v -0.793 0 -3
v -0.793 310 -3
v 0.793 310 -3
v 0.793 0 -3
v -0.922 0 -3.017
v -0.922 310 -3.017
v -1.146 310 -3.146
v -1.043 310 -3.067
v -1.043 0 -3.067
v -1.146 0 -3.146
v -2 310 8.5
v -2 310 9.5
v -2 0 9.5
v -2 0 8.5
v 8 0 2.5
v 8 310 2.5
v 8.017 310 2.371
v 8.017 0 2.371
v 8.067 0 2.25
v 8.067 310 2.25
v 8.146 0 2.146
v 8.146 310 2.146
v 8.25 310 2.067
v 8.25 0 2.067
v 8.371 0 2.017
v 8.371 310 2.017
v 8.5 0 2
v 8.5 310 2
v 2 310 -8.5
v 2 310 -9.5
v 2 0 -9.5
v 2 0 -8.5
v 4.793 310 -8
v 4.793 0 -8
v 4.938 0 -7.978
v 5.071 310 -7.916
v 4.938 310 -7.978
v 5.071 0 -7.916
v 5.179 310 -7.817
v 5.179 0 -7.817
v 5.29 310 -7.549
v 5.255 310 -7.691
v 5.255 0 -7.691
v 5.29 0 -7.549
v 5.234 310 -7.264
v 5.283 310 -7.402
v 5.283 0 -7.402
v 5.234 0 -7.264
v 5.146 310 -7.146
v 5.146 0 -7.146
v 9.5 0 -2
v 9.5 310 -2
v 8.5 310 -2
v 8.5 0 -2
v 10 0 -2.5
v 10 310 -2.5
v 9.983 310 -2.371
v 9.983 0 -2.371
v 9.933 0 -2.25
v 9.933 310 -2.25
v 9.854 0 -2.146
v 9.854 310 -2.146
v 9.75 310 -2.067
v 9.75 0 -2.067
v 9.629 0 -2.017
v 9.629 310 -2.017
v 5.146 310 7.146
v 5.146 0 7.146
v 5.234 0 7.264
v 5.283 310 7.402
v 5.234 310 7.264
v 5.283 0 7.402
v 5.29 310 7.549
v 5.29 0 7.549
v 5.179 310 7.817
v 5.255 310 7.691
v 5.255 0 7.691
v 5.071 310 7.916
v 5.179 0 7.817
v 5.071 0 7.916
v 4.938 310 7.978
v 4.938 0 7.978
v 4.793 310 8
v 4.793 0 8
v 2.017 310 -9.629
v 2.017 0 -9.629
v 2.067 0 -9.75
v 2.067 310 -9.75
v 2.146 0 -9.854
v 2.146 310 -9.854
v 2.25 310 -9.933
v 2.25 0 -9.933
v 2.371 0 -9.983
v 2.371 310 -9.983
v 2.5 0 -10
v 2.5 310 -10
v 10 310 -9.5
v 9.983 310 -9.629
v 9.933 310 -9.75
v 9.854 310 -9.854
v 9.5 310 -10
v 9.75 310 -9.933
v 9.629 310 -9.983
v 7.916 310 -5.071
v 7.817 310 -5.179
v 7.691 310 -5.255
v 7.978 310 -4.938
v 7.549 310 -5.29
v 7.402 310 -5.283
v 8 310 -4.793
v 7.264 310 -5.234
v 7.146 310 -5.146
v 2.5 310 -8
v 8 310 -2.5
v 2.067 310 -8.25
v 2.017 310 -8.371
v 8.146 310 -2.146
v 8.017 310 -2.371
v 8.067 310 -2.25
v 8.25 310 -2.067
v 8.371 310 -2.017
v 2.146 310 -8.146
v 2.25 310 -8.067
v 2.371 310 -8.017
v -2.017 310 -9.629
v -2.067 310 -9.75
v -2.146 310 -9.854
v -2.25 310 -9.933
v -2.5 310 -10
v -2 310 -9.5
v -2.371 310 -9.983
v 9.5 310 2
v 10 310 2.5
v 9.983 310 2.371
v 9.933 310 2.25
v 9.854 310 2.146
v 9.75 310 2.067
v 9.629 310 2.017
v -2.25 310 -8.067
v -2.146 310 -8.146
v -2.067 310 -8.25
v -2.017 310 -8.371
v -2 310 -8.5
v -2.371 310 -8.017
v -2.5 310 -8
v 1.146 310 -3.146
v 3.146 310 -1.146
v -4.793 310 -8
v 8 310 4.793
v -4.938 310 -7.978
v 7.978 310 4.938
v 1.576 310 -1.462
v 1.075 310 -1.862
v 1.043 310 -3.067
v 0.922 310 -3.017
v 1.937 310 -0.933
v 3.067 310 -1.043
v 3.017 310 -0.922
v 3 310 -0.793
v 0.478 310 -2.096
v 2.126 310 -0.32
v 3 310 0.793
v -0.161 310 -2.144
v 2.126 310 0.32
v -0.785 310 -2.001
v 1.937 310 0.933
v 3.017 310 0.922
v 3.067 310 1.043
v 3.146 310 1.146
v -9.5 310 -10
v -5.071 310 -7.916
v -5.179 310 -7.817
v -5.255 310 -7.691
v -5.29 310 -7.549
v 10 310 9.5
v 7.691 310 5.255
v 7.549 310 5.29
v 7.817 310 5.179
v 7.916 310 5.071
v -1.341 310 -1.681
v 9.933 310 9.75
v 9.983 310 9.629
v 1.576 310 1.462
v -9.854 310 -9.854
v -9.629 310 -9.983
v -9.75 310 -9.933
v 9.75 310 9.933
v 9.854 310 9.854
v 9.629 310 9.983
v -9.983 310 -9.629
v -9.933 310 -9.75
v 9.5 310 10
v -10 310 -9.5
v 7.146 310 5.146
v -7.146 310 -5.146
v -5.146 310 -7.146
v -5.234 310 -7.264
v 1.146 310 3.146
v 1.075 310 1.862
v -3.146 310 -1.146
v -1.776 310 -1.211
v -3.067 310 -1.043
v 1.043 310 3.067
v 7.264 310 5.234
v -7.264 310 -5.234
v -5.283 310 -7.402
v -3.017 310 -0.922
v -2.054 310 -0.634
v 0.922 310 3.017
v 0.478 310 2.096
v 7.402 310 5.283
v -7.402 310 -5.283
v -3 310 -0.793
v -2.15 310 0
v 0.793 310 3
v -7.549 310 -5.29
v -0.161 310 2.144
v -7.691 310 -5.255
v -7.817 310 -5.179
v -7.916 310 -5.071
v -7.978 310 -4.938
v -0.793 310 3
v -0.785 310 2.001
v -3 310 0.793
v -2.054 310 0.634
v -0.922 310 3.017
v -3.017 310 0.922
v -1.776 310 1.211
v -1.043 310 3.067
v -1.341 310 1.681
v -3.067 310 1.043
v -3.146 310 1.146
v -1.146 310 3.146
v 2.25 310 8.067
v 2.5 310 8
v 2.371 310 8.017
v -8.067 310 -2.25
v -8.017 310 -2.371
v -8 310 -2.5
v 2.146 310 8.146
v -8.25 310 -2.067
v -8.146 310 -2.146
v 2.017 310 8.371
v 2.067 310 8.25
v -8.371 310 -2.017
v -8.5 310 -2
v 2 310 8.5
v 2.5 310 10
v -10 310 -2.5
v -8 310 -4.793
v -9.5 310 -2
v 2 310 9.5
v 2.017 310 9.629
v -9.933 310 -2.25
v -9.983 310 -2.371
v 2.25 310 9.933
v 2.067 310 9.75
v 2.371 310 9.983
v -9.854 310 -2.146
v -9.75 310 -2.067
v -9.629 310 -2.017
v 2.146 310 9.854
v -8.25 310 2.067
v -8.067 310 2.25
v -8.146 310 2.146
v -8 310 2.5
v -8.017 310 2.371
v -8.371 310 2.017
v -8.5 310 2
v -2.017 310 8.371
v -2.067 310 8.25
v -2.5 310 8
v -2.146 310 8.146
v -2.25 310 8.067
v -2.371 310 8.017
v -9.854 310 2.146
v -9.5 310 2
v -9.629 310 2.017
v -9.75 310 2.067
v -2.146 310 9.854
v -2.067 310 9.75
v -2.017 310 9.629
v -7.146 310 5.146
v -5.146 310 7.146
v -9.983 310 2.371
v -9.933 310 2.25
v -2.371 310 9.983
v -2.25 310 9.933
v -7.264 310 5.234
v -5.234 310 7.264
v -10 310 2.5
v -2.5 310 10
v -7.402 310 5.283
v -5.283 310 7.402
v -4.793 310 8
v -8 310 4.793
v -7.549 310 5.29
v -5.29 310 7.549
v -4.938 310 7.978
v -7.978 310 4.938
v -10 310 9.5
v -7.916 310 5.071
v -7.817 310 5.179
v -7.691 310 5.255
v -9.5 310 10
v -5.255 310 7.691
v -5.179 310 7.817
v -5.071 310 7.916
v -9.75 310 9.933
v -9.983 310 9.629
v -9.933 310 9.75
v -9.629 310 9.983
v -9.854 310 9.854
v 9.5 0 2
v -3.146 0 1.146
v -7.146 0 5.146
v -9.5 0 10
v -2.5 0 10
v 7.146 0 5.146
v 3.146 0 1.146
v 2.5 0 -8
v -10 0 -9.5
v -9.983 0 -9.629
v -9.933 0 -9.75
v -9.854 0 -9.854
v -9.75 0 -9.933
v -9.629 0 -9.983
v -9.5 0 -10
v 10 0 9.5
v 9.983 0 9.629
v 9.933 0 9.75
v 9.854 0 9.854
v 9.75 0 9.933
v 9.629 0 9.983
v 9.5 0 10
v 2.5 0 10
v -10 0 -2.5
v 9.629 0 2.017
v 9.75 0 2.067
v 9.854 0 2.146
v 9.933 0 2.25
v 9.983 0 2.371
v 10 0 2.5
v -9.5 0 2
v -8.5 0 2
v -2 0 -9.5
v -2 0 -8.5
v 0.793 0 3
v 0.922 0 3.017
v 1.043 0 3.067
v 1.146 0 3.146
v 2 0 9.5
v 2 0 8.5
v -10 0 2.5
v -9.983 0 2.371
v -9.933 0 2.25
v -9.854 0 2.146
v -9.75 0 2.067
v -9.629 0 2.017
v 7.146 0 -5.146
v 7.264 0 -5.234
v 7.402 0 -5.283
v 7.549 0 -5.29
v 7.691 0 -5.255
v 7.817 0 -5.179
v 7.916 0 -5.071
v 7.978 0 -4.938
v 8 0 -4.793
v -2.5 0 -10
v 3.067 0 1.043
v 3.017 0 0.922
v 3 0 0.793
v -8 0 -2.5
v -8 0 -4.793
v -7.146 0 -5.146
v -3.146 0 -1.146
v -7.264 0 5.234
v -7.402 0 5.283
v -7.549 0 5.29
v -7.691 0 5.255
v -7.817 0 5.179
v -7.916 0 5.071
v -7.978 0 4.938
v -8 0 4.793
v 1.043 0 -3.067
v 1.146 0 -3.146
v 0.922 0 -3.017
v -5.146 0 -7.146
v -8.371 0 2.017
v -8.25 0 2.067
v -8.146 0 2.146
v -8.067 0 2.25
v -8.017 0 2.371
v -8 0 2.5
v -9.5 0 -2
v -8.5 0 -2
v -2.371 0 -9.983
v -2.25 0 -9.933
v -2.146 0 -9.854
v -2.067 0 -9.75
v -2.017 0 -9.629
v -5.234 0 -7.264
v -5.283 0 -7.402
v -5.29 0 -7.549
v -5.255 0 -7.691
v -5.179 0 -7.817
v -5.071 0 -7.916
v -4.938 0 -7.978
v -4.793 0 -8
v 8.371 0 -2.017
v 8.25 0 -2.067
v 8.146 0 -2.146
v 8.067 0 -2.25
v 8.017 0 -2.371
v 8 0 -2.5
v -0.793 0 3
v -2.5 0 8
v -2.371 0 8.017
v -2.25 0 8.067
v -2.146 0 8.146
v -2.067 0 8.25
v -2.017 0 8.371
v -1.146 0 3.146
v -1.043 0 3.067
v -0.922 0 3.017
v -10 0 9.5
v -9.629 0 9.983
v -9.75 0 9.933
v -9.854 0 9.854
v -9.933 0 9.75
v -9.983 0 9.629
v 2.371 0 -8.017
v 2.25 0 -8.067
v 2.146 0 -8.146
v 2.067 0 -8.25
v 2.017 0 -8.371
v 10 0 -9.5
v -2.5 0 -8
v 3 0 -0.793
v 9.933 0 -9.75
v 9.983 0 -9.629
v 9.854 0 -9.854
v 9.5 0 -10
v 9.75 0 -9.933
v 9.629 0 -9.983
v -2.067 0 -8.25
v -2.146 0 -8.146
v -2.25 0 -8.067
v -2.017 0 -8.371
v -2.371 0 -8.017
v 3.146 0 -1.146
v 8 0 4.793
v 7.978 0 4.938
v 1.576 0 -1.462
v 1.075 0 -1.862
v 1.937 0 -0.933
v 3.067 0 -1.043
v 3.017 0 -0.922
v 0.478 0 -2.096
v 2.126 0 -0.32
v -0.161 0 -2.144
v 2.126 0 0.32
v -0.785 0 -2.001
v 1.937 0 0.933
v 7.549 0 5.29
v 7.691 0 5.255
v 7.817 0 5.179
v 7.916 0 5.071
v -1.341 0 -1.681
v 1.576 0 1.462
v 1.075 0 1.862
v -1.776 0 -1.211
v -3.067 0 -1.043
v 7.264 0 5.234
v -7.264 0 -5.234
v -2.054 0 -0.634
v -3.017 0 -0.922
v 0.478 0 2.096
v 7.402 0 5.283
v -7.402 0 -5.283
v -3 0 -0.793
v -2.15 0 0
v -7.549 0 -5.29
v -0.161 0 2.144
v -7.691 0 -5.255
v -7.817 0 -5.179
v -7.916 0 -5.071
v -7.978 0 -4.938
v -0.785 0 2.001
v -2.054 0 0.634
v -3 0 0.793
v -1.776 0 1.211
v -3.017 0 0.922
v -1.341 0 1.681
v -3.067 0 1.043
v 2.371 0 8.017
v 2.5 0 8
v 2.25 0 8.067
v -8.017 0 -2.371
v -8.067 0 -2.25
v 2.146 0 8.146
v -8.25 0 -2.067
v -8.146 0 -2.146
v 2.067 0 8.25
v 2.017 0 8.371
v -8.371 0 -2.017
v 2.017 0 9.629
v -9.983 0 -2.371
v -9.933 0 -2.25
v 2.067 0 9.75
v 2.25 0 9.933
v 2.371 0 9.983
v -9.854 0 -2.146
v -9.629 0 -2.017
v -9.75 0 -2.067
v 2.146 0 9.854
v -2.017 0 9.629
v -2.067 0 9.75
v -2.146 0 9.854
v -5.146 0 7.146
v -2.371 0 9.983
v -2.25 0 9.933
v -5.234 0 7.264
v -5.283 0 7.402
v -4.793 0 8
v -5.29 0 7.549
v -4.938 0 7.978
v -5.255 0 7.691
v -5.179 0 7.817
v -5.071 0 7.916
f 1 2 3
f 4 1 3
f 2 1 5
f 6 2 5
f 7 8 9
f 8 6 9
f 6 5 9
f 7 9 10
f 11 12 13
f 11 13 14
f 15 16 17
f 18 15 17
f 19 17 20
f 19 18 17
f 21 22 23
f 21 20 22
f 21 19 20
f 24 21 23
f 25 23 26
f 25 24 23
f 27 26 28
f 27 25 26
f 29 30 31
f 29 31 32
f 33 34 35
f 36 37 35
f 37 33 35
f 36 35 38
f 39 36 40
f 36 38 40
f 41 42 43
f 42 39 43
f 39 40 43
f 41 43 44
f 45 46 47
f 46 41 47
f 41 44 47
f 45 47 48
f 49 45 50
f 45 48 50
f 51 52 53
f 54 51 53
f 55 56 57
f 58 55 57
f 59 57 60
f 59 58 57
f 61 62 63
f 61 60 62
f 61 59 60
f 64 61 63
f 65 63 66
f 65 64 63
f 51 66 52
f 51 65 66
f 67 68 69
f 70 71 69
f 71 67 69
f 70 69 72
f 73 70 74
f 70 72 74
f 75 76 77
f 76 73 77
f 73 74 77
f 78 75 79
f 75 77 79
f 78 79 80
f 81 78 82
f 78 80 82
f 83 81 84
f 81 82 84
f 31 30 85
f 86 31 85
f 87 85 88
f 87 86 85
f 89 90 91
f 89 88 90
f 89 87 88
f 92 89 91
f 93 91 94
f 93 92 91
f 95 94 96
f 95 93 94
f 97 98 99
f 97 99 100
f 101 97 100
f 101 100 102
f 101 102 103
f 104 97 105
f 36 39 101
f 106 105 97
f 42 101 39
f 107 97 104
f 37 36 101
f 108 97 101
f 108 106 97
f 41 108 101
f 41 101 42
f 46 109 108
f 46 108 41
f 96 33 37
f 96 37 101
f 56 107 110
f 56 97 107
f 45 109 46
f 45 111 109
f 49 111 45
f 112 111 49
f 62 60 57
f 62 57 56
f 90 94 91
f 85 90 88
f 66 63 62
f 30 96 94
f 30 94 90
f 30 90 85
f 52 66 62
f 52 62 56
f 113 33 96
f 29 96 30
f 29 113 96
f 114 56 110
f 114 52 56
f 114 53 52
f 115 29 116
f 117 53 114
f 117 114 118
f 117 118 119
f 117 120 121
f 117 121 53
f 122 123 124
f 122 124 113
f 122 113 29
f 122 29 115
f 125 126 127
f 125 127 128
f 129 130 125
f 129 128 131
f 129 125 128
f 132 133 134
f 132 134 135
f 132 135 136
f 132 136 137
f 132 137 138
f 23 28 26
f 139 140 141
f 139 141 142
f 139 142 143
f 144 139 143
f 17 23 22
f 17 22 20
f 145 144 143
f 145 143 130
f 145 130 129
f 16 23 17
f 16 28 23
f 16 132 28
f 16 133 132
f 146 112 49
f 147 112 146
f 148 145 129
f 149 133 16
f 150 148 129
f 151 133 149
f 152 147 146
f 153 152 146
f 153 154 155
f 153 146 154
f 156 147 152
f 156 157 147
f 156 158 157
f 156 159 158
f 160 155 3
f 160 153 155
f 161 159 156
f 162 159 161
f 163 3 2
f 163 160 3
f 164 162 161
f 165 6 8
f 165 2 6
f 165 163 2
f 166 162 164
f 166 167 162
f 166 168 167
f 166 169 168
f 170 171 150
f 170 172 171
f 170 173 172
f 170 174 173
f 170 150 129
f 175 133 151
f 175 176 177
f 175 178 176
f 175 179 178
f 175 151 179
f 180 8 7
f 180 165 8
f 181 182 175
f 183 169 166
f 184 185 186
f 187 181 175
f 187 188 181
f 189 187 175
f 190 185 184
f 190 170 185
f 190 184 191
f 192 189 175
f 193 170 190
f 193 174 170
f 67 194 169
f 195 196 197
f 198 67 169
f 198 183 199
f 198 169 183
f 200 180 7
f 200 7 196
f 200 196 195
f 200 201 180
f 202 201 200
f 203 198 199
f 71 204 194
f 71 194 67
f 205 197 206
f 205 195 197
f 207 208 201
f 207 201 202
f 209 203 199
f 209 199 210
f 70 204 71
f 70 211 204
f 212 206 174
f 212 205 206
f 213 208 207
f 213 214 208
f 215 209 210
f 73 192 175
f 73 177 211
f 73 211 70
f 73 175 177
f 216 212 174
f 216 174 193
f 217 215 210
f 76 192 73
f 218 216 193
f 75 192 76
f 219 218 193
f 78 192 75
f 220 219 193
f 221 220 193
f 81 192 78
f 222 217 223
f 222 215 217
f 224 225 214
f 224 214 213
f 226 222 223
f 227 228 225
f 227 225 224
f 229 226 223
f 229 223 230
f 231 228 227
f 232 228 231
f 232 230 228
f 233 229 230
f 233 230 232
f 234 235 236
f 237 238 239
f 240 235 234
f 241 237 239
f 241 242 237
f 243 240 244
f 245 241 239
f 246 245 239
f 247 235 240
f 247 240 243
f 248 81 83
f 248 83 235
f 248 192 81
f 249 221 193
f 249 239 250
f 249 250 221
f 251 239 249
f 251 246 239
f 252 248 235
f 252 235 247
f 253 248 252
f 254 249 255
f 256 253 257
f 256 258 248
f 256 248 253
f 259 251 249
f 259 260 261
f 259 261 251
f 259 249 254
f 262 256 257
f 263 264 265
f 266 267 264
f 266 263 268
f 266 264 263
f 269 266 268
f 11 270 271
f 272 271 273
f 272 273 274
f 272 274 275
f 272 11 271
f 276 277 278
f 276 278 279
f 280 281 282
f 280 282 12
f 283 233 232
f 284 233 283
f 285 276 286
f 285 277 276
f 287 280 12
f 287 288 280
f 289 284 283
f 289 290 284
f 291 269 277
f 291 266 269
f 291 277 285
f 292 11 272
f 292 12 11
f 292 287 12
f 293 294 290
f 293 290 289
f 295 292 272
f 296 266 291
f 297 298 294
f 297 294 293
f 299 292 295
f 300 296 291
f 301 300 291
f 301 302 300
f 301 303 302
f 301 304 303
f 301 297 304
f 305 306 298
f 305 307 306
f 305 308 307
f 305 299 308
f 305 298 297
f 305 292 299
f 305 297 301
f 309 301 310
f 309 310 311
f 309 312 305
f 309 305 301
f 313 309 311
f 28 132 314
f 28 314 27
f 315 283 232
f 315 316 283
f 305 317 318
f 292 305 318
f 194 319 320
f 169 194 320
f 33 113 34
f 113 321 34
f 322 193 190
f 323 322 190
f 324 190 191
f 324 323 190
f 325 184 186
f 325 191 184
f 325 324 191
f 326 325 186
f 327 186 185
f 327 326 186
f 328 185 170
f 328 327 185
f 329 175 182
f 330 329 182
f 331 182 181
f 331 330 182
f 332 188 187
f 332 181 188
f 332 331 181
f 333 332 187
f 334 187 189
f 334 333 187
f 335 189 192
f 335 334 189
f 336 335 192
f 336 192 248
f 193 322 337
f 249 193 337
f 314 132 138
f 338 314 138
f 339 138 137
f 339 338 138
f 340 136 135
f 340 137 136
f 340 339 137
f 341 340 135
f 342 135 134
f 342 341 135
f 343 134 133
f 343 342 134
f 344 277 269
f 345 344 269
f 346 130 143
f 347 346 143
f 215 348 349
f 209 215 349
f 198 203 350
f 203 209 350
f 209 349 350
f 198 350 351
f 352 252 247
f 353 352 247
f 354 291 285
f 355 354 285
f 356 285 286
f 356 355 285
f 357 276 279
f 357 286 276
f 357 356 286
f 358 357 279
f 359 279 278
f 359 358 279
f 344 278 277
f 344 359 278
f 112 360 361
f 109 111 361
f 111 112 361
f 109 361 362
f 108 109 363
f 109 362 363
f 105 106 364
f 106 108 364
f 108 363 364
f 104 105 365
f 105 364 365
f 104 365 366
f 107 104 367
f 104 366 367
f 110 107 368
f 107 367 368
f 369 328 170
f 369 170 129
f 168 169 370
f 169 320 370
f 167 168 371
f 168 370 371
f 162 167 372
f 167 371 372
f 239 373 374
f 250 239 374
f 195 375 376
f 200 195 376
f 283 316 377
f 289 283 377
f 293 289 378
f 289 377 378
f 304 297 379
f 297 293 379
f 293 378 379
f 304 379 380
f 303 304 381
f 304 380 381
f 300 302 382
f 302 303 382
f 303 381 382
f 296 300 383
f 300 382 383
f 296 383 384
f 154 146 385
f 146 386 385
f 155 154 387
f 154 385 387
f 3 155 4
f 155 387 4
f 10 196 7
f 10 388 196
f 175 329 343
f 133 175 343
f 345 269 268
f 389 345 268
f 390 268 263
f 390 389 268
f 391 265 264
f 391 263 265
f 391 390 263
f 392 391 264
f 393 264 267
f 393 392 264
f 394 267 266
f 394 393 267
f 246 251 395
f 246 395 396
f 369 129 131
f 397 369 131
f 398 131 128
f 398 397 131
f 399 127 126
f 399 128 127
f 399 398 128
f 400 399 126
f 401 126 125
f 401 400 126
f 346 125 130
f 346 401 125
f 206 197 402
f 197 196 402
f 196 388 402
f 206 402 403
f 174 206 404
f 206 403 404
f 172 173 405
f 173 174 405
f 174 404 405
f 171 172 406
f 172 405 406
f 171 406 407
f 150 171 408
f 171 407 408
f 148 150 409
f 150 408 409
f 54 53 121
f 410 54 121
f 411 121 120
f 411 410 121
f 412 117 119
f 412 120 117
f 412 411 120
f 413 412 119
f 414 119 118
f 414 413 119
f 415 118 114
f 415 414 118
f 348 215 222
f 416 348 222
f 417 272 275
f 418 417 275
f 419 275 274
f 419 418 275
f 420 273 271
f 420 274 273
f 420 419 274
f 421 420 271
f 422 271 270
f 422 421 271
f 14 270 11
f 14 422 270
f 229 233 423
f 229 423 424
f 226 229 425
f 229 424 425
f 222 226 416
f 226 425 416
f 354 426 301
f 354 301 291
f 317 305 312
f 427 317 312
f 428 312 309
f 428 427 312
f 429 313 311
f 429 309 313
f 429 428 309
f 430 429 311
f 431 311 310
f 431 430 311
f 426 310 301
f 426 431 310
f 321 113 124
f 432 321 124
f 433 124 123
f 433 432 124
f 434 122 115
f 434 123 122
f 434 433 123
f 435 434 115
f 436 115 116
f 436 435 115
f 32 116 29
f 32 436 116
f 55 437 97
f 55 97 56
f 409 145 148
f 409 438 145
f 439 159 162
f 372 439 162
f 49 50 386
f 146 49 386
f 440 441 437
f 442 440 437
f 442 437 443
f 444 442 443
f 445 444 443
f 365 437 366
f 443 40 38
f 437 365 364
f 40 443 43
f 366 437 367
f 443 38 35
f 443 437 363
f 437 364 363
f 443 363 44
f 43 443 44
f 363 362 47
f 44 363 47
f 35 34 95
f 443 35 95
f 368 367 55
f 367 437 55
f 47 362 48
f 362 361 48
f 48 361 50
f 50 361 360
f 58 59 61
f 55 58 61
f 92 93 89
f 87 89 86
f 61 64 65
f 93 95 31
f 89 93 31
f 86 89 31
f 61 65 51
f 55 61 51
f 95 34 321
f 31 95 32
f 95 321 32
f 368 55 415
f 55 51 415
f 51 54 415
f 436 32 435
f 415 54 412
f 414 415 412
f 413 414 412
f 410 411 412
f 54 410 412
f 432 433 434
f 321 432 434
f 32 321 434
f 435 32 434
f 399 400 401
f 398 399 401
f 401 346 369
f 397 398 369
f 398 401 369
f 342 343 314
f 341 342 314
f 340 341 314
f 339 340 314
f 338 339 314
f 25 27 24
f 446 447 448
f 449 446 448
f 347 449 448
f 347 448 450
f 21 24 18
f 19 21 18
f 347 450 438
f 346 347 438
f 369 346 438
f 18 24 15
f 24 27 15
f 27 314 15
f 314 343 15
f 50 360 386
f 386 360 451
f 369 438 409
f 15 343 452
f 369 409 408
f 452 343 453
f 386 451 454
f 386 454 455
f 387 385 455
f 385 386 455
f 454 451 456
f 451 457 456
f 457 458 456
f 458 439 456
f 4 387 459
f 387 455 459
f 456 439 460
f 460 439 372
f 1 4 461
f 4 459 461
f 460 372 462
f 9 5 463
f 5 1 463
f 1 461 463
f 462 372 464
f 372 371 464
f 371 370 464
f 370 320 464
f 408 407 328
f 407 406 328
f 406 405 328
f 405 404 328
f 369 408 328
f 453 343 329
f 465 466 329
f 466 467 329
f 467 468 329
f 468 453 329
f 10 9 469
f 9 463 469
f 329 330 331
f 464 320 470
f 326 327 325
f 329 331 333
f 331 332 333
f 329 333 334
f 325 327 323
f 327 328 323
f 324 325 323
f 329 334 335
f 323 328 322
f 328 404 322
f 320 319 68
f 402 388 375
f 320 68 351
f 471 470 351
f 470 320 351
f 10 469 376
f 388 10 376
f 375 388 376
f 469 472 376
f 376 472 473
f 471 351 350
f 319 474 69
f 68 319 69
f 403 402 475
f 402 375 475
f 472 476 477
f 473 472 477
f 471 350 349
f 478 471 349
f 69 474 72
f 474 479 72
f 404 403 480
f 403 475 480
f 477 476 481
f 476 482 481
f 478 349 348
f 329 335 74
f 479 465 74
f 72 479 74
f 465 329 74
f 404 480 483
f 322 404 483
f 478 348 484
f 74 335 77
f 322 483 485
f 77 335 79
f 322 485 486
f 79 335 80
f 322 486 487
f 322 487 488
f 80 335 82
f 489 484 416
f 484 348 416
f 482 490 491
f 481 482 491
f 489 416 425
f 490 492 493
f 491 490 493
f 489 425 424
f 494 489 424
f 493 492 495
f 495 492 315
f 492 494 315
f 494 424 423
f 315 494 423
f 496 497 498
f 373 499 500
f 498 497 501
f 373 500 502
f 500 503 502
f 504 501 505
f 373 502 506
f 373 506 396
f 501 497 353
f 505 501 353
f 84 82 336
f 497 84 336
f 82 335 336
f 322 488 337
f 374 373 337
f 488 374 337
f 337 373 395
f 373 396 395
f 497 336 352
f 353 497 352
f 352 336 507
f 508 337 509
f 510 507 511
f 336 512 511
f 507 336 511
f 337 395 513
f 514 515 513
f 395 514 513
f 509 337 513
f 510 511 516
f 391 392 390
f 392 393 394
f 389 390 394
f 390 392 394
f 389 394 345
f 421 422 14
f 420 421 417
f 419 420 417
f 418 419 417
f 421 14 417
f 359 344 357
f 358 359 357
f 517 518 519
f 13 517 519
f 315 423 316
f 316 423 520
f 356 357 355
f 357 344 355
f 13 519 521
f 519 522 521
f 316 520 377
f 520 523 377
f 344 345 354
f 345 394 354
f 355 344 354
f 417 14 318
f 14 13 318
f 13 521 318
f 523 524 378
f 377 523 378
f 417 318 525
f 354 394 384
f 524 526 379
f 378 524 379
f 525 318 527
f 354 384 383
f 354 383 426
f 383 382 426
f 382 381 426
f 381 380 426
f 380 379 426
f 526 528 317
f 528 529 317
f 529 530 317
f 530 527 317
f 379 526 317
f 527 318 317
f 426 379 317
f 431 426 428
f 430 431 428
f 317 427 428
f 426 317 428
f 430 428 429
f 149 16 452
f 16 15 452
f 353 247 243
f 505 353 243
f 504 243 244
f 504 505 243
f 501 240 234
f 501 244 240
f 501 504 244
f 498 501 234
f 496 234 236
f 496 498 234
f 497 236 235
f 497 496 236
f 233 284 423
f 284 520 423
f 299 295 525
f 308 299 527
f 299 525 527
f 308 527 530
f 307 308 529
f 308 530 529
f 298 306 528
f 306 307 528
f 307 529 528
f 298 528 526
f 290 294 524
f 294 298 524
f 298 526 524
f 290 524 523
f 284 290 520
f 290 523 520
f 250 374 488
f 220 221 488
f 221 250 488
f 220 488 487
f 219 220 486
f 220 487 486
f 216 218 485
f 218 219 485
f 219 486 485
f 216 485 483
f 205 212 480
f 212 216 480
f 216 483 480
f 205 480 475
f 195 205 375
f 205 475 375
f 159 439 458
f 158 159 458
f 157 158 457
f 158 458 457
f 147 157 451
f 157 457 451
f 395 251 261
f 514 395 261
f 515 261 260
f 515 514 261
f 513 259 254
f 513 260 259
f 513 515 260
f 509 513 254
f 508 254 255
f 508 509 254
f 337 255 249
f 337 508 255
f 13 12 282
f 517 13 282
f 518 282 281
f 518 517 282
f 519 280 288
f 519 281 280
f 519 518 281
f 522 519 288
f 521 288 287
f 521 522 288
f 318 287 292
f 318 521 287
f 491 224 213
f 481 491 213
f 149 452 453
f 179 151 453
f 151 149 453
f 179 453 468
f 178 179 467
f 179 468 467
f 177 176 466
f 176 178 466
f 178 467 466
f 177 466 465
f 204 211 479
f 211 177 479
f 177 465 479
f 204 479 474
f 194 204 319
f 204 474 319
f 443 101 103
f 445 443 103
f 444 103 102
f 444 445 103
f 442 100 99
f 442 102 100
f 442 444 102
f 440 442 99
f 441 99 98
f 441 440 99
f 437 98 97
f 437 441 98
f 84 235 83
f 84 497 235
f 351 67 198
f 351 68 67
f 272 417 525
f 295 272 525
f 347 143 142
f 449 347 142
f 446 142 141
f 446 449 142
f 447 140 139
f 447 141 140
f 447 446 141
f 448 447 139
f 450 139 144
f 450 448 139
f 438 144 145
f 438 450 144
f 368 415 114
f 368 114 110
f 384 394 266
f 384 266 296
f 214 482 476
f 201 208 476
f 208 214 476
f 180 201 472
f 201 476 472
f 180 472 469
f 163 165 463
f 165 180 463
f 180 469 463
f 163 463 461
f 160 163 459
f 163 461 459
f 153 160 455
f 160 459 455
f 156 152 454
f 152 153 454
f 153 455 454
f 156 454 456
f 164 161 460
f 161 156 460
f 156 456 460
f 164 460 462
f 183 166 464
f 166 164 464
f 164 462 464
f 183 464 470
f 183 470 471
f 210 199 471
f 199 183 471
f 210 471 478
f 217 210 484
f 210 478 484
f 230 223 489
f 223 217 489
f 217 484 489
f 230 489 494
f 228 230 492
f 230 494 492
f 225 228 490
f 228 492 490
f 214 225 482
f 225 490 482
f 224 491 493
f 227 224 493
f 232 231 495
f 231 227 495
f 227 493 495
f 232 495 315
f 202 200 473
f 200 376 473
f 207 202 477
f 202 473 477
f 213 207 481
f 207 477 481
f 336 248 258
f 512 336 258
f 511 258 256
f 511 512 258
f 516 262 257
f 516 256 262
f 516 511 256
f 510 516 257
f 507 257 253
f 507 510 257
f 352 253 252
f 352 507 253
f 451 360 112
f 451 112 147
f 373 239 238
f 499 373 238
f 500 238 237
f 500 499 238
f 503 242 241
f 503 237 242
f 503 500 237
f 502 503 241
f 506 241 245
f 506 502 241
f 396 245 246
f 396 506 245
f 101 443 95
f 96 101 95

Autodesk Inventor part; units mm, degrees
sketch "Sketch1" plane through (0, 0, 0) normal (0, 1, 0) x (-1, 0, 0)
  line L0 (2.5, 10) -> (9.5, 10) construction
  line L1 (10, -2.5) -> (10, -9.5) construction
  line L2 (-2.5, -10) -> (-9.5, -10) construction
  line L3 (-10, 2.5) -> (-10, 10) construction
  line L4 (-10, 10) -> (10, -10) construction
  line L5 (10, 10) -> (-10, -10) construction
  circle A0 centre (0, 0) radius 2.15
  line L6 (10, 9.5) -> (10, 2.5)
  line L7 (9.5, 2) -> (8.5, 2)
  line L8 (8, 2.5) -> (8, 4.7929)
  line L9 (-0.7929, 3) -> (0.7929, 3)
  line L10 (3, 0.7929) -> (3, -0.7929)
  line L11 (0.7929, -3) -> (-0.7929, -3)
  line L12 (-3, -0.7929) -> (-3, 0.7929)
  line L13 (-3, 3) -> (3, -3) construction
  line L14 (3, 3) -> (-3, -3) construction
  line L15 (10, -10) -> (10, -2)
  line L16 (9.5, -2) -> (8.5, -2)
  line L17 (8, -2.5) -> (8, -4.7929)
  line L18 (7.1464, -5.1464) -> (3.1464, -1.1464)
  line L19 (7.1464, 5.1464) -> (3.1464, 1.1464)
  line L20 (8, 6) -> (13.6569, 6) construction
  line L21 (10, 10) -> (2, 10)
  line L22 (2, 9.5) -> (2, 8.5)
  line L23 (2.5, 8) -> (4.7929, 8)
  line L24 (5.1464, 7.1464) -> (1.1464, 3.1464)
  line L25 (-9.5, 10) -> (-2.5, 10)
  line L26 (-2, 9.5) -> (-2, 8.5)
  line L27 (-2.5, 8) -> (-4.7929, 8)
  line L28 (-5.1464, 7.1464) -> (-1.1464, 3.1464)
  line L29 (-10, 9.5) -> (-10, 2)
  line L30 (-9.5, 2) -> (-8.5, 2)
  line L31 (-8, 2.5) -> (-8, 4.7929)
  line L32 (-7.1464, 5.1464) -> (-3.1464, 1.1464)
  line L33 (-10, -9.5) -> (-10, -2.5)
  line L34 (-9.5, -2) -> (-8.5, -2)
  line L35 (-8, -2.5) -> (-8, -4.7929)
  line L36 (-7.1464, -5.1464) -> (-3.1464, -1.1464)
  line L37 (-8, -6) -> (-2.3431, -6) construction
  line L38 (-10, -10) -> (-2, -10)
  line L39 (-2, -9.5) -> (-2, -8.5)
  line L40 (-2.5, -8) -> (-4.7929, -8)
  line L41 (-5.1464, -7.1464) -> (-1.1464, -3.1464)
  line L42 (9.5, -10) -> (2.5, -10)
  line L43 (2, -9.5) -> (2, -8.5)
  line L44 (2.5, -8) -> (4.7929, -8)
  line L45 (5.1464, -7.1464) -> (1.1464, -3.1464)
  arc A1 (8, 2.5) -> (8.5, 2) centre (8.5, 2.5) ccw
  arc A2 (9.5, 2) -> (10, 2.5) centre (9.5, 2.5) ccw
  arc A3 (10, -2.5) -> (9.5, -2) centre (9.5, -2.5) ccw
  arc A4 (8.5, -2) -> (8, -2.5) centre (8.5, -2.5) ccw
  arc A5 (7.1464, -5.1464) -> (8, -4.7929) centre (7.5, -4.7929) ccw
  arc A6 (3, -0.7929) -> (3.1464, -1.1464) centre (3.5, -0.7929) ccw
  arc A7 (3.1464, 1.1464) -> (3, 0.7929) centre (3.5, 0.7929) ccw
  arc A8 (8, 4.7929) -> (7.1464, 5.1464) centre (7.5, 4.7929) ccw
  arc A9 (5.1464, 7.1464) -> (4.7929, 8) centre (4.7929, 7.5) ccw
  arc A10 (0.7929, 3) -> (1.1464, 3.1464) centre (0.7929, 3.5) ccw
  arc A11 (-1.1464, 3.1464) -> (-0.7929, 3) centre (-0.7929, 3.5) ccw
  arc A12 (-3, 0.7929) -> (-3.1464, 1.1464) centre (-3.5, 0.7929) ccw
  arc A13 (-3.1464, -1.1464) -> (-3, -0.7929) centre (-3.5, -0.7929) ccw
  arc A14 (-0.7929, -3) -> (-1.1464, -3.1464) centre (-0.7929, -3.5) ccw
  arc A15 (1.1464, -3.1464) -> (0.7929, -3) centre (0.7929, -3.5) ccw
  arc A16 (-4.7929, 8) -> (-5.1464, 7.1464) centre (-4.7929, 7.5) ccw
  arc A17 (-7.1464, 5.1464) -> (-8, 4.7929) centre (-7.5, 4.7929) ccw
  arc A18 (-8, -4.7929) -> (-7.1464, -5.1464) centre (-7.5, -4.7929) ccw
  arc A19 (-5.1464, -7.1464) -> (-4.7929, -8) centre (-4.7929, -7.5) ccw
  arc A20 (4.7929, -8) -> (5.1464, -7.1464) centre (4.7929, -7.5) ccw
  arc A21 (2, 8.5) -> (2.5, 8) centre (2.5, 8.5) ccw
  arc A22 (2.5, 10) -> (2, 9.5) centre (2.5, 9.5) ccw
  arc A23 (-2, 9.5) -> (-2.5, 10) centre (-2.5, 9.5) ccw
  arc A24 (-2.5, 8) -> (-2, 8.5) centre (-2.5, 8.5) ccw
  arc A25 (-10, 2.5) -> (-9.5, 2) centre (-9.5, 2.5) ccw
  arc A26 (-8.5, 2) -> (-8, 2.5) centre (-8.5, 2.5) ccw
  arc A27 (-8, -2.5) -> (-8.5, -2) centre (-8.5, -2.5) ccw
  arc A28 (-9.5, -2) -> (-10, -2.5) centre (-9.5, -2.5) ccw
  arc A29 (-2.5, -10) -> (-2, -9.5) centre (-2.5, -9.5) ccw
  arc A30 (-2, -8.5) -> (-2.5, -8) centre (-2.5, -8.5) ccw
  arc A31 (2, -9.5) -> (2.5, -10) centre (2.5, -9.5) ccw
  arc A32 (2.5, -8) -> (2, -8.5) centre (2.5, -8.5) ccw
  arc A33 (9.5, -10) -> (10, -9.5) centre (9.5, -9.5) ccw
  arc A34 (10, 9.5) -> (9.5, 10) centre (9.5, 9.5) ccw
  arc A35 (-9.5, 10) -> (-10, 9.5) centre (-9.5, 9.5) ccw
  arc A36 (-10, -9.5) -> (-9.5, -10) centre (-9.5, -9.5) ccw
  point P0 (10, 2)
  point P1 (8, 2)
  point P2 (8, -2)
  point P3 (8, -6)
  point P4 (2, 8)
  point P5 (6, 8)
  point P6 (-2, 10)
  point P7 (-2, 8)
  point P8 (-6, 8)
  point P9 (-8, 2)
  point P10 (-8, 6)
  point P11 (-10, -2)
  point P12 (-8, -2)
  point P13 (-2, -8)
  point P14 (-6, -8)
  point P15 (2, -10)
  point P16 (2, -8)
  point P17 (6, -8)
  point P18 (1, 3)
  point P19 (3, 1)
  point P20 (3, -1)
  point P21 (1, -3)
  point P22 (-1, -3)
  point P23 (-3, -1)
  point P24 (-3, 1)
  point P25 (-1, 3)
  dimension "d0" = 20
  dimension "d1" = 20
  dimension "d2" = 4.3
  dimension "d3" = 8
  dimension "d4" = 2
  dimension "d5" = 4
  dimension "d6" = 6
  dimension "d7" = 6
  dimension "d8" = 8
  dimension "d9" = 2
  dimension "d10" = 4
  dimension "d11" = 45
  dimension "d12" = 135
  dimension "d13" = 8
  dimension "d14" = 2
  dimension "d15" = 4
  dimension "d16" = 45
  dimension "d17" = 8
  dimension "d18" = 2
  dimension "d19" = 4
  dimension "d20" = 45
  dimension "d21" = 8
  dimension "d22" = 2
  dimension "d23" = 4
  dimension "d24" = 45
  dimension "d25" = 8
  dimension "d26" = 2
  dimension "d27" = 4
  dimension "d28" = 45
  dimension "d29" = 8
  dimension "d30" = 2
  dimension "d31" = 4
  dimension "d32" = 45
  dimension "d33" = 8
  dimension "d34" = 2
  dimension "d35" = 4
  dimension "d36" = 45
  dimension "d37" = 2
  dimension "d38" = 2
  dimension "d39" = 2
  dimension "d40" = 2
  dimension "d41" = 0.5
extrude "Extrusion1" add sketch "Sketch1" along normal blind 310
ref_plane "Work Plane3" through (-3, 0, 0) normal (0, 0, 1) x (1, 0, 0)
ref_plane "Work Plane4" through (10, 155, -9.5) normal (0, 1, 0) x (-1, 0, 0)
ref_plane "Work Plane5" through (0, 0, 9.5) normal (1, 0, 0) x (0, 0, -1)
properties part number "Strut"
